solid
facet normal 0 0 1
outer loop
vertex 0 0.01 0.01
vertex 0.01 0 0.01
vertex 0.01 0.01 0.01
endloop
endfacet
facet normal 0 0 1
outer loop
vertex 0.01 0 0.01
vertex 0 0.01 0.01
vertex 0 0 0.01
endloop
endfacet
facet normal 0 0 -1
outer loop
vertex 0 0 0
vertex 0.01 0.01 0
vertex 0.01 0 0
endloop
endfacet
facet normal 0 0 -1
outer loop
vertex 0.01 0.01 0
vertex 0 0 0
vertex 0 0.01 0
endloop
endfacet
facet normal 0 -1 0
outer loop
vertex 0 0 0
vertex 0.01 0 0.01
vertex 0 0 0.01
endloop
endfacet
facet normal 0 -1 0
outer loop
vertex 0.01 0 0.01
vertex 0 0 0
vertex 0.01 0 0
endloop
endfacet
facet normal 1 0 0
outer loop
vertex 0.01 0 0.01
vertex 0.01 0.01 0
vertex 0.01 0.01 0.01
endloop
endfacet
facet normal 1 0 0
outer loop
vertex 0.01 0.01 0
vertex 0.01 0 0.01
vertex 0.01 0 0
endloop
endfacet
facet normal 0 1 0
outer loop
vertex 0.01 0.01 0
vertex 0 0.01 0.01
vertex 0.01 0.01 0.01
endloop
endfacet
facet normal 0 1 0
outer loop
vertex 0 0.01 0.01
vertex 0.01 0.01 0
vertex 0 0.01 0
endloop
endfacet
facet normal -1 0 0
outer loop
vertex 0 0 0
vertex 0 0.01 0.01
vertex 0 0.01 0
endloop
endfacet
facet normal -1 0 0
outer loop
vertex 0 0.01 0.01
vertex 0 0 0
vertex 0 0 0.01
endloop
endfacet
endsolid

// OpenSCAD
/***
 * @function common_saturating_equivalence
 * @brief Check Logistic and Tanh adapters across small, canonical and extreme finite gains.
 * Source: [`common/saturating_equivalence.scad`](common/saturating_equivalence.scad)
 */
include <../../src/logistic_dwell/base.scad>
include <../../src/tanh_triad/base.scad>
for(theta=[0:.5:360],gain=[1e-12,3,8,1000,1e300],depth=[.01,.2,.46]) {
    radius=_cg_logistic_dwell_unit_radius(theta,gain,depth);
    reference=1+depth/(1+exp(-gain*sin(2*theta)))-depth/2;
    assert(abs(radius-reference)<1e-12,"logistic law changed");
    assert(radius>0 && radius>=1-depth/2-1e-12 && radius<=1+depth/2+1e-12,"logistic bounds changed");
}
for(theta=[0:.5:360],transition=[1e-12,.8,1.8,1000,1e300]) {
    radius=_cg_tanh_triad_unit_radius(theta,transition,.13,.03);
    reference=1+.13*_cg_tanh(transition*sin(3*theta))+.03*cos(6*theta+20);
    assert(abs(radius-reference)<1e-12,"tanh correction ownership changed");
}
cube(.01);
